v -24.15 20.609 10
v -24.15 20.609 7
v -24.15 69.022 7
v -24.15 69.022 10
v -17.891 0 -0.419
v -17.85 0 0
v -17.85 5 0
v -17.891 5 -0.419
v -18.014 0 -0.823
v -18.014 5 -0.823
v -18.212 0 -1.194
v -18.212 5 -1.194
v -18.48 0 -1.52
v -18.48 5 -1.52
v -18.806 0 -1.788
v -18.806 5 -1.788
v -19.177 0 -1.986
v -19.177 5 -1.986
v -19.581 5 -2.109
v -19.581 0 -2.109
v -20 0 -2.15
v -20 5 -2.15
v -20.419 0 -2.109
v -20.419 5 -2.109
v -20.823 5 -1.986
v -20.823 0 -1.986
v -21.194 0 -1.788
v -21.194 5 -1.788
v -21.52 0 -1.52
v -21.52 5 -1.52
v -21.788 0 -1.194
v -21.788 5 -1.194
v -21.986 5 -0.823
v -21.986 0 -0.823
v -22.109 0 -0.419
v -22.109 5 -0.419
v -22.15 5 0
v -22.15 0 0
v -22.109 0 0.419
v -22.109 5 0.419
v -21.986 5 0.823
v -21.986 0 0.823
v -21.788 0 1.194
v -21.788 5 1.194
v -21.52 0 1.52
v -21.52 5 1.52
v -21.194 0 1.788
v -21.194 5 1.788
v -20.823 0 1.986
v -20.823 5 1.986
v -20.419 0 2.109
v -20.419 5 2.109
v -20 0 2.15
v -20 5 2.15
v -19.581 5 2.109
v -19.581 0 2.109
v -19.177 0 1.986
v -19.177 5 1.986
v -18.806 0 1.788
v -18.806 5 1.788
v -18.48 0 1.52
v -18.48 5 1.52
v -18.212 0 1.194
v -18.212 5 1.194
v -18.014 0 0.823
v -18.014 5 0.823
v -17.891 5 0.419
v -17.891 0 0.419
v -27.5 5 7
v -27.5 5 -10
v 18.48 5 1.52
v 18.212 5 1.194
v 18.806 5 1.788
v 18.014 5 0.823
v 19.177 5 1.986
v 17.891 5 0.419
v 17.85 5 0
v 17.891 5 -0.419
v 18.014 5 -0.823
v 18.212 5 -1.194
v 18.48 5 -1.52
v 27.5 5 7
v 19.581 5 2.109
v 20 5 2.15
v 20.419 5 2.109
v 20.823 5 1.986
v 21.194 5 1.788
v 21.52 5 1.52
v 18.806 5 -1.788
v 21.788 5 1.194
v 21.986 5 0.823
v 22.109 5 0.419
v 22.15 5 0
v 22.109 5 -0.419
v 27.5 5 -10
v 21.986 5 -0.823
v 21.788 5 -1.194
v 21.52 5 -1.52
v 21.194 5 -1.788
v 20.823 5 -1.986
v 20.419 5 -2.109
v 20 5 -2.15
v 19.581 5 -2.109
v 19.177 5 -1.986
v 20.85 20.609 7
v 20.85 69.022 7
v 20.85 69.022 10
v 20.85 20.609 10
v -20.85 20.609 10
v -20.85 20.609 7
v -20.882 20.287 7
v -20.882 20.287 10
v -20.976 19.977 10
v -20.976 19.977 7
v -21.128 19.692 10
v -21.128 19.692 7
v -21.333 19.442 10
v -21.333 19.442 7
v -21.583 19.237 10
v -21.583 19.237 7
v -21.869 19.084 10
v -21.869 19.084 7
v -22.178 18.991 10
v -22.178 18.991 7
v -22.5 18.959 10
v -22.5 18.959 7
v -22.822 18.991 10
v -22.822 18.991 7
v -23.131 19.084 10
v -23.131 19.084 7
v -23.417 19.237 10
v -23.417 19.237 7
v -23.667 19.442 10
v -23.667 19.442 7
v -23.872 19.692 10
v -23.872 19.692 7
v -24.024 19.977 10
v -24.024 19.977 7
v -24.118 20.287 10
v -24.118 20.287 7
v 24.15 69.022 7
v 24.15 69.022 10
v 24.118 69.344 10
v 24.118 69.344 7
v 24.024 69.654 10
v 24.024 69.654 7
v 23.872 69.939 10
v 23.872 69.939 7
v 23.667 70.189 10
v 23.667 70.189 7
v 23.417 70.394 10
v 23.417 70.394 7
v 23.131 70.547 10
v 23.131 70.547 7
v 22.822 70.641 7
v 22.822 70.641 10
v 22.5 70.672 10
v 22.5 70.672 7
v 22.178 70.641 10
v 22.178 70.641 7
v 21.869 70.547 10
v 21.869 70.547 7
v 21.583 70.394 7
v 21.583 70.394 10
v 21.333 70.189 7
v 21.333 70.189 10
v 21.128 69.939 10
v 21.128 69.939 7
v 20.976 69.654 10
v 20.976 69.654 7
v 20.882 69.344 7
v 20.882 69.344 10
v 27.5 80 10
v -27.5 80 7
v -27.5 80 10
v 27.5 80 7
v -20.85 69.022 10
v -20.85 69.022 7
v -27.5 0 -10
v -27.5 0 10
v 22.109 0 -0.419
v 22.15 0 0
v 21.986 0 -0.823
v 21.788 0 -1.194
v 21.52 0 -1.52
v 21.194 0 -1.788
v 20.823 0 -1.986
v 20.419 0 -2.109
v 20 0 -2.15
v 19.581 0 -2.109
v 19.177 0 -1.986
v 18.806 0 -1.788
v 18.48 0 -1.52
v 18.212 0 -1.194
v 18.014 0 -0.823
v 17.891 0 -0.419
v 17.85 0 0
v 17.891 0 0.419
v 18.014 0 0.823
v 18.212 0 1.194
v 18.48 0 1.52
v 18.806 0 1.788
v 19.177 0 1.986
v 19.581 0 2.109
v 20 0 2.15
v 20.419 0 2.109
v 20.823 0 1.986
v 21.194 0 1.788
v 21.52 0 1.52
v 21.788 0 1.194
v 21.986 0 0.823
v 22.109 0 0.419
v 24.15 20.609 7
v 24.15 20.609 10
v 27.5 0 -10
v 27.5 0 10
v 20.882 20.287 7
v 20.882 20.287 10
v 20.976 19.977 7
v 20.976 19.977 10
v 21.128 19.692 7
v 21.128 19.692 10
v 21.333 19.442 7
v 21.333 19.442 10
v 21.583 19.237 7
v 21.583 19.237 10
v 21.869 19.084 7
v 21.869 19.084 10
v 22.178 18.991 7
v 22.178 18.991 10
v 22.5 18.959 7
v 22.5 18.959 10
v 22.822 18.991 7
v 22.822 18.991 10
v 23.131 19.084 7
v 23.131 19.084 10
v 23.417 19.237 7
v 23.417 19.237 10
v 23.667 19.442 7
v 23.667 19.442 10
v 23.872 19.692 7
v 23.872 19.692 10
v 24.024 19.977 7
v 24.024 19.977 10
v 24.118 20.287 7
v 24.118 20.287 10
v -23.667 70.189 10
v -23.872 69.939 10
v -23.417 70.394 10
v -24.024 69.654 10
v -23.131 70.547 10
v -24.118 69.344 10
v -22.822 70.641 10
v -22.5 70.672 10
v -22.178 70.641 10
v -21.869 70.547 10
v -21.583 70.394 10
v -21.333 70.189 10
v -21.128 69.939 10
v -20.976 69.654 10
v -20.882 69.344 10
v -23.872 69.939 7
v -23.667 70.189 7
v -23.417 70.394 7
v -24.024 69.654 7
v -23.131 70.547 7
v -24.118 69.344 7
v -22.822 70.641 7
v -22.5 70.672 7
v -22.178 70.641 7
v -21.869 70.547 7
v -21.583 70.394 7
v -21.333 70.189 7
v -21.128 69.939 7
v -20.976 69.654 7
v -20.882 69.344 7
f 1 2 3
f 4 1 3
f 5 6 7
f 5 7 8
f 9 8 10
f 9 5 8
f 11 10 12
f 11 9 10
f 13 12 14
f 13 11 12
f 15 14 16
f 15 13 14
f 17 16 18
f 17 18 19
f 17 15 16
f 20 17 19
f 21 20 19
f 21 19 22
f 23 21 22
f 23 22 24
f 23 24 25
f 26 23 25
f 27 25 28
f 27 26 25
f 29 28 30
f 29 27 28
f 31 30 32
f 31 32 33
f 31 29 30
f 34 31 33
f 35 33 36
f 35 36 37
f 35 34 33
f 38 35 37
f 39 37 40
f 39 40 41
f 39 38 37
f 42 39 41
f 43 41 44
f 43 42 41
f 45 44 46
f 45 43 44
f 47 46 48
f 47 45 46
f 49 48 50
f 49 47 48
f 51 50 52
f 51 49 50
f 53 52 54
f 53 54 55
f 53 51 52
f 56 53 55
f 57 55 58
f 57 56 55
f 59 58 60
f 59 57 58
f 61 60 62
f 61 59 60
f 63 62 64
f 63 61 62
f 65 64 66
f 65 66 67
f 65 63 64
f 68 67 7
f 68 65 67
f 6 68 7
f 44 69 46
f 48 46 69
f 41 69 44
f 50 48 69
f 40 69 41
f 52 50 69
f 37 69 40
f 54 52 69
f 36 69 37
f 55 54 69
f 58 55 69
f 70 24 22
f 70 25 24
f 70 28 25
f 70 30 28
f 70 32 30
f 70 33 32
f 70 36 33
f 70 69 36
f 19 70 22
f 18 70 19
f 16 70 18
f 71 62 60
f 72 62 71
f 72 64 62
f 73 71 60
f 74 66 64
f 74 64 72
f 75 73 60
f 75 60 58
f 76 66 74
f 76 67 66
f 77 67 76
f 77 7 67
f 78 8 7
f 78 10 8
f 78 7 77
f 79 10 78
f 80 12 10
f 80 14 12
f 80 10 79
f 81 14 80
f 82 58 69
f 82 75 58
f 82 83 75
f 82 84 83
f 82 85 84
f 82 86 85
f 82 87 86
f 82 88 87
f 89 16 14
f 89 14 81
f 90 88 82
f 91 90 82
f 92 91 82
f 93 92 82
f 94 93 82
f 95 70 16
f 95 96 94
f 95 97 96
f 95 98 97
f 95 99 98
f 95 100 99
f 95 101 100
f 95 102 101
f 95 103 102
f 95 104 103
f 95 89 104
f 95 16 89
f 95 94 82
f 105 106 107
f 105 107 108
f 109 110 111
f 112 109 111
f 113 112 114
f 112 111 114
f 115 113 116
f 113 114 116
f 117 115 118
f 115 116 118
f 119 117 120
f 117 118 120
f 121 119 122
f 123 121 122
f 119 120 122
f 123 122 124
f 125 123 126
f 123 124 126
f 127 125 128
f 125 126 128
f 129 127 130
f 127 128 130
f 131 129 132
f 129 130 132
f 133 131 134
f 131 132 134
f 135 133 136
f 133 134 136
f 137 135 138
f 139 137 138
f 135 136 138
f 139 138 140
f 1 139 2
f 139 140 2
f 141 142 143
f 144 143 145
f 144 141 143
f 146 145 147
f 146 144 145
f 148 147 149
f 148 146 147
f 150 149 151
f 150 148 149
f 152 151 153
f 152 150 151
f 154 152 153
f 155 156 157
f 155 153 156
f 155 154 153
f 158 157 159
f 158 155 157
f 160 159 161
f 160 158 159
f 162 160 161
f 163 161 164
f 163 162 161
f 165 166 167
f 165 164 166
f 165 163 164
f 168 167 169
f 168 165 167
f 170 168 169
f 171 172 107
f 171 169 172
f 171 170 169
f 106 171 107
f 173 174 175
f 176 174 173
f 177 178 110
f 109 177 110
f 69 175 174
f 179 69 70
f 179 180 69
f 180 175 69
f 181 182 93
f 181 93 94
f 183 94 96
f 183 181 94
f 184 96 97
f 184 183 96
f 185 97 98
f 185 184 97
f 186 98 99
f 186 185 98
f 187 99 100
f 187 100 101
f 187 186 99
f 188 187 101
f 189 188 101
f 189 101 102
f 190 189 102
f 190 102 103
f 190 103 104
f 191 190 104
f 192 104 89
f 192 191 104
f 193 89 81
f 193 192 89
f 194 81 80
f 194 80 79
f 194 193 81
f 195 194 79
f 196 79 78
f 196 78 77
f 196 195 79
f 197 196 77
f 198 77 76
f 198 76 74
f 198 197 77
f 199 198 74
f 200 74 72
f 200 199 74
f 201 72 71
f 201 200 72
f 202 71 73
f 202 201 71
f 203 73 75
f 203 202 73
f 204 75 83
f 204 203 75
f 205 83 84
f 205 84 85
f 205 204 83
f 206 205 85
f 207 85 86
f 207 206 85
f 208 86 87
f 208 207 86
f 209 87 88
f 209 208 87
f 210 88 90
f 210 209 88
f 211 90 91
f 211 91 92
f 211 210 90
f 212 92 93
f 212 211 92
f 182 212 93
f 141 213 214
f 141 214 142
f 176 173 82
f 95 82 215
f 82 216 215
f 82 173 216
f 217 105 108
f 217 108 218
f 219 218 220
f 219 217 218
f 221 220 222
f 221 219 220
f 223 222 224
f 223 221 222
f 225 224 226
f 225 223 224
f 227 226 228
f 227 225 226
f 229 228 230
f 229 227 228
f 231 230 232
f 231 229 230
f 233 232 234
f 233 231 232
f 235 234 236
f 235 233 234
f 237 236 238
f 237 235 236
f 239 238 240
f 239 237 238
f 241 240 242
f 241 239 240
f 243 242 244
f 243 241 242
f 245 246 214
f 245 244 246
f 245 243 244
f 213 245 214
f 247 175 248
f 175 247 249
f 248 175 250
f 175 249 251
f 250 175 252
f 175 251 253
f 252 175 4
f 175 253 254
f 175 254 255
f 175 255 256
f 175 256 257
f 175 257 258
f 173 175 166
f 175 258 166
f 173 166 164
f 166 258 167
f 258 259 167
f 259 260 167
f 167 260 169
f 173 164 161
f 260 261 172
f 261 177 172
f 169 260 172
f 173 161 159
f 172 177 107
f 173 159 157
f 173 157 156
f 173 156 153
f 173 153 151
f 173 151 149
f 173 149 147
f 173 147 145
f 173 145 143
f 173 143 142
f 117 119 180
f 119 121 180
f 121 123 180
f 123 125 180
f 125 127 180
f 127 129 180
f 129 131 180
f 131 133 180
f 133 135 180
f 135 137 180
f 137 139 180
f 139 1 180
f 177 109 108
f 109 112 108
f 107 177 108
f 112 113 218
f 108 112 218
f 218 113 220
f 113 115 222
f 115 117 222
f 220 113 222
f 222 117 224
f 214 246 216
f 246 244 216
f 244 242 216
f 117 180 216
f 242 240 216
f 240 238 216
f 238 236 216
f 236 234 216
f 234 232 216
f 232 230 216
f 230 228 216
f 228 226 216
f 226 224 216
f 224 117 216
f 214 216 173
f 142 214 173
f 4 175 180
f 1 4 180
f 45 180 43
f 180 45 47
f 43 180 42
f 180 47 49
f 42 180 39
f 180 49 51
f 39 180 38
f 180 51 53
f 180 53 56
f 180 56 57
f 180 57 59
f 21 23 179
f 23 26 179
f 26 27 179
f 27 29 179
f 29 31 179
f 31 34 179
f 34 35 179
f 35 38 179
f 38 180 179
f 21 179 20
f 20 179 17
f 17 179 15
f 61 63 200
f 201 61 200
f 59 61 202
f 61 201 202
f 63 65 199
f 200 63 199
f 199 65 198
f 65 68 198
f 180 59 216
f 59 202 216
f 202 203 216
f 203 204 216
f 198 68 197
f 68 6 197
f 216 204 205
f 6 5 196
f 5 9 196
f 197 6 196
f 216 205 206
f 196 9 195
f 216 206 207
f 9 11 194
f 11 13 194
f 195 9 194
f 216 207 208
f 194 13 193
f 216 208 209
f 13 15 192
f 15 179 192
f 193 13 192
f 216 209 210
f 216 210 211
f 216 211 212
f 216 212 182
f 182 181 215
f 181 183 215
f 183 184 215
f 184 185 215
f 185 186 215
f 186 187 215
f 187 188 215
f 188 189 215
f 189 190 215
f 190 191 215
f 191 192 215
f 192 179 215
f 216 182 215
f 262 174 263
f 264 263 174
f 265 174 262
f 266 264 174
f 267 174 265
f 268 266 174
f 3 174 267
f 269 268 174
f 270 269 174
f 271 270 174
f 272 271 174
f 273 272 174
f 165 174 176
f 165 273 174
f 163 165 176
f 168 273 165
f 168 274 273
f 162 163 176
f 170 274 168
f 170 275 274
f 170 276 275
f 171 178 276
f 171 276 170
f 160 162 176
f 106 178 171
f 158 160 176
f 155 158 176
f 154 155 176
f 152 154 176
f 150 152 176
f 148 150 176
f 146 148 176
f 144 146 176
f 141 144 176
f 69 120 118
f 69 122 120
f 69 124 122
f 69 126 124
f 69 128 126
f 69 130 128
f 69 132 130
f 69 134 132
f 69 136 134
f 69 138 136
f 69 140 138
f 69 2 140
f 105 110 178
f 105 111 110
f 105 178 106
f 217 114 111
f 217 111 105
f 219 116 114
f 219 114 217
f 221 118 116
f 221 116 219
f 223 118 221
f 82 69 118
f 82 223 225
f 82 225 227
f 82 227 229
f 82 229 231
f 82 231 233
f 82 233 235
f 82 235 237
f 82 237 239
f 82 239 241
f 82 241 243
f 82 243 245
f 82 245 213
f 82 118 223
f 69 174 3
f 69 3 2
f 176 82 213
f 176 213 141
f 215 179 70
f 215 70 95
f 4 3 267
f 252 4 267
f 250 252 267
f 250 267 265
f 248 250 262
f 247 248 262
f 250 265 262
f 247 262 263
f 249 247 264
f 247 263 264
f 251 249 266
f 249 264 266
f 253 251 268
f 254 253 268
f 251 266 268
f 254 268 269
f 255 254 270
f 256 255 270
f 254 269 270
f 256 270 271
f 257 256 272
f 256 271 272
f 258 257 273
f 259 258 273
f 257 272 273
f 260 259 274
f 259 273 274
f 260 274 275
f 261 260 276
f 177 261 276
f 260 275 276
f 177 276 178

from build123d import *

# Parameters (mm, degrees)
SKETCH1_W           = 55
SKETCH1_H           = 20
SKETCH1_R           = 2.15
BOSS_EXTRUDE1_DEPTH = 5
SKETCH2_W           = 55
SKETCH2_H           = 3
BOSS_EXTRUDE2_DEPTH = 75
CUT_EXTRUDE1_DEPTH  = 75


with BuildPart() as part:
    # Sketch1 → Boss-Extrude1 (new body)
    with BuildSketch(Plane(origin=(0, 0, 0), x_dir=(1, 0, 0), z_dir=(0, 1, 0))):
        Rectangle(SKETCH1_W, SKETCH1_H)
        with Locations((-20, 0)):
            Circle(SKETCH1_R, mode=Mode.SUBTRACT)
        with Locations((20, 0)):
            Circle(SKETCH1_R, mode=Mode.SUBTRACT)
    extrude(amount=BOSS_EXTRUDE1_DEPTH)

    # Sketch2 → Boss-Extrude2 (add)
    with BuildSketch(Plane(origin=(0, 5, 0), x_dir=(1, 0, 0), z_dir=(0, 1, 0))):
        with Locations((0, -8.5)):
            Rectangle(SKETCH2_W, SKETCH2_H)
    extrude(amount=BOSS_EXTRUDE2_DEPTH)

    # Sketch3 → Cut-Extrude1 (cut)
    with BuildSketch(Plane(origin=(0, 0, 7), x_dir=(-1, 0, 0), z_dir=(0, 0, -1))):
        with BuildLine():
            Line((-20.85, 69.022285576), (-20.85, 20.608862032))
            ThreePointArc((-20.85, 20.608862032), (-22.5, 18.958862032), (-24.15, 20.608862032))
            Line((-24.15, 20.608862032), (-24.15, 69.022285576))
            ThreePointArc((-24.15, 69.022285576), (-22.5, 70.672285576), (-20.85, 69.022285576))
        make_face()
        with BuildLine():
            Line((20.85, 69.022285576), (20.85, 20.608862032))
            ThreePointArc((20.85, 20.608862032), (22.5, 18.958862032), (24.15, 20.608862032))
            Line((24.15, 20.608862032), (24.15, 69.022285576))
            ThreePointArc((24.15, 69.022285576), (22.5, 70.672285576), (20.85, 69.022285576))
        make_face()
    extrude(amount=-CUT_EXTRUDE1_DEPTH, mode=Mode.SUBTRACT)


solid = part.part
